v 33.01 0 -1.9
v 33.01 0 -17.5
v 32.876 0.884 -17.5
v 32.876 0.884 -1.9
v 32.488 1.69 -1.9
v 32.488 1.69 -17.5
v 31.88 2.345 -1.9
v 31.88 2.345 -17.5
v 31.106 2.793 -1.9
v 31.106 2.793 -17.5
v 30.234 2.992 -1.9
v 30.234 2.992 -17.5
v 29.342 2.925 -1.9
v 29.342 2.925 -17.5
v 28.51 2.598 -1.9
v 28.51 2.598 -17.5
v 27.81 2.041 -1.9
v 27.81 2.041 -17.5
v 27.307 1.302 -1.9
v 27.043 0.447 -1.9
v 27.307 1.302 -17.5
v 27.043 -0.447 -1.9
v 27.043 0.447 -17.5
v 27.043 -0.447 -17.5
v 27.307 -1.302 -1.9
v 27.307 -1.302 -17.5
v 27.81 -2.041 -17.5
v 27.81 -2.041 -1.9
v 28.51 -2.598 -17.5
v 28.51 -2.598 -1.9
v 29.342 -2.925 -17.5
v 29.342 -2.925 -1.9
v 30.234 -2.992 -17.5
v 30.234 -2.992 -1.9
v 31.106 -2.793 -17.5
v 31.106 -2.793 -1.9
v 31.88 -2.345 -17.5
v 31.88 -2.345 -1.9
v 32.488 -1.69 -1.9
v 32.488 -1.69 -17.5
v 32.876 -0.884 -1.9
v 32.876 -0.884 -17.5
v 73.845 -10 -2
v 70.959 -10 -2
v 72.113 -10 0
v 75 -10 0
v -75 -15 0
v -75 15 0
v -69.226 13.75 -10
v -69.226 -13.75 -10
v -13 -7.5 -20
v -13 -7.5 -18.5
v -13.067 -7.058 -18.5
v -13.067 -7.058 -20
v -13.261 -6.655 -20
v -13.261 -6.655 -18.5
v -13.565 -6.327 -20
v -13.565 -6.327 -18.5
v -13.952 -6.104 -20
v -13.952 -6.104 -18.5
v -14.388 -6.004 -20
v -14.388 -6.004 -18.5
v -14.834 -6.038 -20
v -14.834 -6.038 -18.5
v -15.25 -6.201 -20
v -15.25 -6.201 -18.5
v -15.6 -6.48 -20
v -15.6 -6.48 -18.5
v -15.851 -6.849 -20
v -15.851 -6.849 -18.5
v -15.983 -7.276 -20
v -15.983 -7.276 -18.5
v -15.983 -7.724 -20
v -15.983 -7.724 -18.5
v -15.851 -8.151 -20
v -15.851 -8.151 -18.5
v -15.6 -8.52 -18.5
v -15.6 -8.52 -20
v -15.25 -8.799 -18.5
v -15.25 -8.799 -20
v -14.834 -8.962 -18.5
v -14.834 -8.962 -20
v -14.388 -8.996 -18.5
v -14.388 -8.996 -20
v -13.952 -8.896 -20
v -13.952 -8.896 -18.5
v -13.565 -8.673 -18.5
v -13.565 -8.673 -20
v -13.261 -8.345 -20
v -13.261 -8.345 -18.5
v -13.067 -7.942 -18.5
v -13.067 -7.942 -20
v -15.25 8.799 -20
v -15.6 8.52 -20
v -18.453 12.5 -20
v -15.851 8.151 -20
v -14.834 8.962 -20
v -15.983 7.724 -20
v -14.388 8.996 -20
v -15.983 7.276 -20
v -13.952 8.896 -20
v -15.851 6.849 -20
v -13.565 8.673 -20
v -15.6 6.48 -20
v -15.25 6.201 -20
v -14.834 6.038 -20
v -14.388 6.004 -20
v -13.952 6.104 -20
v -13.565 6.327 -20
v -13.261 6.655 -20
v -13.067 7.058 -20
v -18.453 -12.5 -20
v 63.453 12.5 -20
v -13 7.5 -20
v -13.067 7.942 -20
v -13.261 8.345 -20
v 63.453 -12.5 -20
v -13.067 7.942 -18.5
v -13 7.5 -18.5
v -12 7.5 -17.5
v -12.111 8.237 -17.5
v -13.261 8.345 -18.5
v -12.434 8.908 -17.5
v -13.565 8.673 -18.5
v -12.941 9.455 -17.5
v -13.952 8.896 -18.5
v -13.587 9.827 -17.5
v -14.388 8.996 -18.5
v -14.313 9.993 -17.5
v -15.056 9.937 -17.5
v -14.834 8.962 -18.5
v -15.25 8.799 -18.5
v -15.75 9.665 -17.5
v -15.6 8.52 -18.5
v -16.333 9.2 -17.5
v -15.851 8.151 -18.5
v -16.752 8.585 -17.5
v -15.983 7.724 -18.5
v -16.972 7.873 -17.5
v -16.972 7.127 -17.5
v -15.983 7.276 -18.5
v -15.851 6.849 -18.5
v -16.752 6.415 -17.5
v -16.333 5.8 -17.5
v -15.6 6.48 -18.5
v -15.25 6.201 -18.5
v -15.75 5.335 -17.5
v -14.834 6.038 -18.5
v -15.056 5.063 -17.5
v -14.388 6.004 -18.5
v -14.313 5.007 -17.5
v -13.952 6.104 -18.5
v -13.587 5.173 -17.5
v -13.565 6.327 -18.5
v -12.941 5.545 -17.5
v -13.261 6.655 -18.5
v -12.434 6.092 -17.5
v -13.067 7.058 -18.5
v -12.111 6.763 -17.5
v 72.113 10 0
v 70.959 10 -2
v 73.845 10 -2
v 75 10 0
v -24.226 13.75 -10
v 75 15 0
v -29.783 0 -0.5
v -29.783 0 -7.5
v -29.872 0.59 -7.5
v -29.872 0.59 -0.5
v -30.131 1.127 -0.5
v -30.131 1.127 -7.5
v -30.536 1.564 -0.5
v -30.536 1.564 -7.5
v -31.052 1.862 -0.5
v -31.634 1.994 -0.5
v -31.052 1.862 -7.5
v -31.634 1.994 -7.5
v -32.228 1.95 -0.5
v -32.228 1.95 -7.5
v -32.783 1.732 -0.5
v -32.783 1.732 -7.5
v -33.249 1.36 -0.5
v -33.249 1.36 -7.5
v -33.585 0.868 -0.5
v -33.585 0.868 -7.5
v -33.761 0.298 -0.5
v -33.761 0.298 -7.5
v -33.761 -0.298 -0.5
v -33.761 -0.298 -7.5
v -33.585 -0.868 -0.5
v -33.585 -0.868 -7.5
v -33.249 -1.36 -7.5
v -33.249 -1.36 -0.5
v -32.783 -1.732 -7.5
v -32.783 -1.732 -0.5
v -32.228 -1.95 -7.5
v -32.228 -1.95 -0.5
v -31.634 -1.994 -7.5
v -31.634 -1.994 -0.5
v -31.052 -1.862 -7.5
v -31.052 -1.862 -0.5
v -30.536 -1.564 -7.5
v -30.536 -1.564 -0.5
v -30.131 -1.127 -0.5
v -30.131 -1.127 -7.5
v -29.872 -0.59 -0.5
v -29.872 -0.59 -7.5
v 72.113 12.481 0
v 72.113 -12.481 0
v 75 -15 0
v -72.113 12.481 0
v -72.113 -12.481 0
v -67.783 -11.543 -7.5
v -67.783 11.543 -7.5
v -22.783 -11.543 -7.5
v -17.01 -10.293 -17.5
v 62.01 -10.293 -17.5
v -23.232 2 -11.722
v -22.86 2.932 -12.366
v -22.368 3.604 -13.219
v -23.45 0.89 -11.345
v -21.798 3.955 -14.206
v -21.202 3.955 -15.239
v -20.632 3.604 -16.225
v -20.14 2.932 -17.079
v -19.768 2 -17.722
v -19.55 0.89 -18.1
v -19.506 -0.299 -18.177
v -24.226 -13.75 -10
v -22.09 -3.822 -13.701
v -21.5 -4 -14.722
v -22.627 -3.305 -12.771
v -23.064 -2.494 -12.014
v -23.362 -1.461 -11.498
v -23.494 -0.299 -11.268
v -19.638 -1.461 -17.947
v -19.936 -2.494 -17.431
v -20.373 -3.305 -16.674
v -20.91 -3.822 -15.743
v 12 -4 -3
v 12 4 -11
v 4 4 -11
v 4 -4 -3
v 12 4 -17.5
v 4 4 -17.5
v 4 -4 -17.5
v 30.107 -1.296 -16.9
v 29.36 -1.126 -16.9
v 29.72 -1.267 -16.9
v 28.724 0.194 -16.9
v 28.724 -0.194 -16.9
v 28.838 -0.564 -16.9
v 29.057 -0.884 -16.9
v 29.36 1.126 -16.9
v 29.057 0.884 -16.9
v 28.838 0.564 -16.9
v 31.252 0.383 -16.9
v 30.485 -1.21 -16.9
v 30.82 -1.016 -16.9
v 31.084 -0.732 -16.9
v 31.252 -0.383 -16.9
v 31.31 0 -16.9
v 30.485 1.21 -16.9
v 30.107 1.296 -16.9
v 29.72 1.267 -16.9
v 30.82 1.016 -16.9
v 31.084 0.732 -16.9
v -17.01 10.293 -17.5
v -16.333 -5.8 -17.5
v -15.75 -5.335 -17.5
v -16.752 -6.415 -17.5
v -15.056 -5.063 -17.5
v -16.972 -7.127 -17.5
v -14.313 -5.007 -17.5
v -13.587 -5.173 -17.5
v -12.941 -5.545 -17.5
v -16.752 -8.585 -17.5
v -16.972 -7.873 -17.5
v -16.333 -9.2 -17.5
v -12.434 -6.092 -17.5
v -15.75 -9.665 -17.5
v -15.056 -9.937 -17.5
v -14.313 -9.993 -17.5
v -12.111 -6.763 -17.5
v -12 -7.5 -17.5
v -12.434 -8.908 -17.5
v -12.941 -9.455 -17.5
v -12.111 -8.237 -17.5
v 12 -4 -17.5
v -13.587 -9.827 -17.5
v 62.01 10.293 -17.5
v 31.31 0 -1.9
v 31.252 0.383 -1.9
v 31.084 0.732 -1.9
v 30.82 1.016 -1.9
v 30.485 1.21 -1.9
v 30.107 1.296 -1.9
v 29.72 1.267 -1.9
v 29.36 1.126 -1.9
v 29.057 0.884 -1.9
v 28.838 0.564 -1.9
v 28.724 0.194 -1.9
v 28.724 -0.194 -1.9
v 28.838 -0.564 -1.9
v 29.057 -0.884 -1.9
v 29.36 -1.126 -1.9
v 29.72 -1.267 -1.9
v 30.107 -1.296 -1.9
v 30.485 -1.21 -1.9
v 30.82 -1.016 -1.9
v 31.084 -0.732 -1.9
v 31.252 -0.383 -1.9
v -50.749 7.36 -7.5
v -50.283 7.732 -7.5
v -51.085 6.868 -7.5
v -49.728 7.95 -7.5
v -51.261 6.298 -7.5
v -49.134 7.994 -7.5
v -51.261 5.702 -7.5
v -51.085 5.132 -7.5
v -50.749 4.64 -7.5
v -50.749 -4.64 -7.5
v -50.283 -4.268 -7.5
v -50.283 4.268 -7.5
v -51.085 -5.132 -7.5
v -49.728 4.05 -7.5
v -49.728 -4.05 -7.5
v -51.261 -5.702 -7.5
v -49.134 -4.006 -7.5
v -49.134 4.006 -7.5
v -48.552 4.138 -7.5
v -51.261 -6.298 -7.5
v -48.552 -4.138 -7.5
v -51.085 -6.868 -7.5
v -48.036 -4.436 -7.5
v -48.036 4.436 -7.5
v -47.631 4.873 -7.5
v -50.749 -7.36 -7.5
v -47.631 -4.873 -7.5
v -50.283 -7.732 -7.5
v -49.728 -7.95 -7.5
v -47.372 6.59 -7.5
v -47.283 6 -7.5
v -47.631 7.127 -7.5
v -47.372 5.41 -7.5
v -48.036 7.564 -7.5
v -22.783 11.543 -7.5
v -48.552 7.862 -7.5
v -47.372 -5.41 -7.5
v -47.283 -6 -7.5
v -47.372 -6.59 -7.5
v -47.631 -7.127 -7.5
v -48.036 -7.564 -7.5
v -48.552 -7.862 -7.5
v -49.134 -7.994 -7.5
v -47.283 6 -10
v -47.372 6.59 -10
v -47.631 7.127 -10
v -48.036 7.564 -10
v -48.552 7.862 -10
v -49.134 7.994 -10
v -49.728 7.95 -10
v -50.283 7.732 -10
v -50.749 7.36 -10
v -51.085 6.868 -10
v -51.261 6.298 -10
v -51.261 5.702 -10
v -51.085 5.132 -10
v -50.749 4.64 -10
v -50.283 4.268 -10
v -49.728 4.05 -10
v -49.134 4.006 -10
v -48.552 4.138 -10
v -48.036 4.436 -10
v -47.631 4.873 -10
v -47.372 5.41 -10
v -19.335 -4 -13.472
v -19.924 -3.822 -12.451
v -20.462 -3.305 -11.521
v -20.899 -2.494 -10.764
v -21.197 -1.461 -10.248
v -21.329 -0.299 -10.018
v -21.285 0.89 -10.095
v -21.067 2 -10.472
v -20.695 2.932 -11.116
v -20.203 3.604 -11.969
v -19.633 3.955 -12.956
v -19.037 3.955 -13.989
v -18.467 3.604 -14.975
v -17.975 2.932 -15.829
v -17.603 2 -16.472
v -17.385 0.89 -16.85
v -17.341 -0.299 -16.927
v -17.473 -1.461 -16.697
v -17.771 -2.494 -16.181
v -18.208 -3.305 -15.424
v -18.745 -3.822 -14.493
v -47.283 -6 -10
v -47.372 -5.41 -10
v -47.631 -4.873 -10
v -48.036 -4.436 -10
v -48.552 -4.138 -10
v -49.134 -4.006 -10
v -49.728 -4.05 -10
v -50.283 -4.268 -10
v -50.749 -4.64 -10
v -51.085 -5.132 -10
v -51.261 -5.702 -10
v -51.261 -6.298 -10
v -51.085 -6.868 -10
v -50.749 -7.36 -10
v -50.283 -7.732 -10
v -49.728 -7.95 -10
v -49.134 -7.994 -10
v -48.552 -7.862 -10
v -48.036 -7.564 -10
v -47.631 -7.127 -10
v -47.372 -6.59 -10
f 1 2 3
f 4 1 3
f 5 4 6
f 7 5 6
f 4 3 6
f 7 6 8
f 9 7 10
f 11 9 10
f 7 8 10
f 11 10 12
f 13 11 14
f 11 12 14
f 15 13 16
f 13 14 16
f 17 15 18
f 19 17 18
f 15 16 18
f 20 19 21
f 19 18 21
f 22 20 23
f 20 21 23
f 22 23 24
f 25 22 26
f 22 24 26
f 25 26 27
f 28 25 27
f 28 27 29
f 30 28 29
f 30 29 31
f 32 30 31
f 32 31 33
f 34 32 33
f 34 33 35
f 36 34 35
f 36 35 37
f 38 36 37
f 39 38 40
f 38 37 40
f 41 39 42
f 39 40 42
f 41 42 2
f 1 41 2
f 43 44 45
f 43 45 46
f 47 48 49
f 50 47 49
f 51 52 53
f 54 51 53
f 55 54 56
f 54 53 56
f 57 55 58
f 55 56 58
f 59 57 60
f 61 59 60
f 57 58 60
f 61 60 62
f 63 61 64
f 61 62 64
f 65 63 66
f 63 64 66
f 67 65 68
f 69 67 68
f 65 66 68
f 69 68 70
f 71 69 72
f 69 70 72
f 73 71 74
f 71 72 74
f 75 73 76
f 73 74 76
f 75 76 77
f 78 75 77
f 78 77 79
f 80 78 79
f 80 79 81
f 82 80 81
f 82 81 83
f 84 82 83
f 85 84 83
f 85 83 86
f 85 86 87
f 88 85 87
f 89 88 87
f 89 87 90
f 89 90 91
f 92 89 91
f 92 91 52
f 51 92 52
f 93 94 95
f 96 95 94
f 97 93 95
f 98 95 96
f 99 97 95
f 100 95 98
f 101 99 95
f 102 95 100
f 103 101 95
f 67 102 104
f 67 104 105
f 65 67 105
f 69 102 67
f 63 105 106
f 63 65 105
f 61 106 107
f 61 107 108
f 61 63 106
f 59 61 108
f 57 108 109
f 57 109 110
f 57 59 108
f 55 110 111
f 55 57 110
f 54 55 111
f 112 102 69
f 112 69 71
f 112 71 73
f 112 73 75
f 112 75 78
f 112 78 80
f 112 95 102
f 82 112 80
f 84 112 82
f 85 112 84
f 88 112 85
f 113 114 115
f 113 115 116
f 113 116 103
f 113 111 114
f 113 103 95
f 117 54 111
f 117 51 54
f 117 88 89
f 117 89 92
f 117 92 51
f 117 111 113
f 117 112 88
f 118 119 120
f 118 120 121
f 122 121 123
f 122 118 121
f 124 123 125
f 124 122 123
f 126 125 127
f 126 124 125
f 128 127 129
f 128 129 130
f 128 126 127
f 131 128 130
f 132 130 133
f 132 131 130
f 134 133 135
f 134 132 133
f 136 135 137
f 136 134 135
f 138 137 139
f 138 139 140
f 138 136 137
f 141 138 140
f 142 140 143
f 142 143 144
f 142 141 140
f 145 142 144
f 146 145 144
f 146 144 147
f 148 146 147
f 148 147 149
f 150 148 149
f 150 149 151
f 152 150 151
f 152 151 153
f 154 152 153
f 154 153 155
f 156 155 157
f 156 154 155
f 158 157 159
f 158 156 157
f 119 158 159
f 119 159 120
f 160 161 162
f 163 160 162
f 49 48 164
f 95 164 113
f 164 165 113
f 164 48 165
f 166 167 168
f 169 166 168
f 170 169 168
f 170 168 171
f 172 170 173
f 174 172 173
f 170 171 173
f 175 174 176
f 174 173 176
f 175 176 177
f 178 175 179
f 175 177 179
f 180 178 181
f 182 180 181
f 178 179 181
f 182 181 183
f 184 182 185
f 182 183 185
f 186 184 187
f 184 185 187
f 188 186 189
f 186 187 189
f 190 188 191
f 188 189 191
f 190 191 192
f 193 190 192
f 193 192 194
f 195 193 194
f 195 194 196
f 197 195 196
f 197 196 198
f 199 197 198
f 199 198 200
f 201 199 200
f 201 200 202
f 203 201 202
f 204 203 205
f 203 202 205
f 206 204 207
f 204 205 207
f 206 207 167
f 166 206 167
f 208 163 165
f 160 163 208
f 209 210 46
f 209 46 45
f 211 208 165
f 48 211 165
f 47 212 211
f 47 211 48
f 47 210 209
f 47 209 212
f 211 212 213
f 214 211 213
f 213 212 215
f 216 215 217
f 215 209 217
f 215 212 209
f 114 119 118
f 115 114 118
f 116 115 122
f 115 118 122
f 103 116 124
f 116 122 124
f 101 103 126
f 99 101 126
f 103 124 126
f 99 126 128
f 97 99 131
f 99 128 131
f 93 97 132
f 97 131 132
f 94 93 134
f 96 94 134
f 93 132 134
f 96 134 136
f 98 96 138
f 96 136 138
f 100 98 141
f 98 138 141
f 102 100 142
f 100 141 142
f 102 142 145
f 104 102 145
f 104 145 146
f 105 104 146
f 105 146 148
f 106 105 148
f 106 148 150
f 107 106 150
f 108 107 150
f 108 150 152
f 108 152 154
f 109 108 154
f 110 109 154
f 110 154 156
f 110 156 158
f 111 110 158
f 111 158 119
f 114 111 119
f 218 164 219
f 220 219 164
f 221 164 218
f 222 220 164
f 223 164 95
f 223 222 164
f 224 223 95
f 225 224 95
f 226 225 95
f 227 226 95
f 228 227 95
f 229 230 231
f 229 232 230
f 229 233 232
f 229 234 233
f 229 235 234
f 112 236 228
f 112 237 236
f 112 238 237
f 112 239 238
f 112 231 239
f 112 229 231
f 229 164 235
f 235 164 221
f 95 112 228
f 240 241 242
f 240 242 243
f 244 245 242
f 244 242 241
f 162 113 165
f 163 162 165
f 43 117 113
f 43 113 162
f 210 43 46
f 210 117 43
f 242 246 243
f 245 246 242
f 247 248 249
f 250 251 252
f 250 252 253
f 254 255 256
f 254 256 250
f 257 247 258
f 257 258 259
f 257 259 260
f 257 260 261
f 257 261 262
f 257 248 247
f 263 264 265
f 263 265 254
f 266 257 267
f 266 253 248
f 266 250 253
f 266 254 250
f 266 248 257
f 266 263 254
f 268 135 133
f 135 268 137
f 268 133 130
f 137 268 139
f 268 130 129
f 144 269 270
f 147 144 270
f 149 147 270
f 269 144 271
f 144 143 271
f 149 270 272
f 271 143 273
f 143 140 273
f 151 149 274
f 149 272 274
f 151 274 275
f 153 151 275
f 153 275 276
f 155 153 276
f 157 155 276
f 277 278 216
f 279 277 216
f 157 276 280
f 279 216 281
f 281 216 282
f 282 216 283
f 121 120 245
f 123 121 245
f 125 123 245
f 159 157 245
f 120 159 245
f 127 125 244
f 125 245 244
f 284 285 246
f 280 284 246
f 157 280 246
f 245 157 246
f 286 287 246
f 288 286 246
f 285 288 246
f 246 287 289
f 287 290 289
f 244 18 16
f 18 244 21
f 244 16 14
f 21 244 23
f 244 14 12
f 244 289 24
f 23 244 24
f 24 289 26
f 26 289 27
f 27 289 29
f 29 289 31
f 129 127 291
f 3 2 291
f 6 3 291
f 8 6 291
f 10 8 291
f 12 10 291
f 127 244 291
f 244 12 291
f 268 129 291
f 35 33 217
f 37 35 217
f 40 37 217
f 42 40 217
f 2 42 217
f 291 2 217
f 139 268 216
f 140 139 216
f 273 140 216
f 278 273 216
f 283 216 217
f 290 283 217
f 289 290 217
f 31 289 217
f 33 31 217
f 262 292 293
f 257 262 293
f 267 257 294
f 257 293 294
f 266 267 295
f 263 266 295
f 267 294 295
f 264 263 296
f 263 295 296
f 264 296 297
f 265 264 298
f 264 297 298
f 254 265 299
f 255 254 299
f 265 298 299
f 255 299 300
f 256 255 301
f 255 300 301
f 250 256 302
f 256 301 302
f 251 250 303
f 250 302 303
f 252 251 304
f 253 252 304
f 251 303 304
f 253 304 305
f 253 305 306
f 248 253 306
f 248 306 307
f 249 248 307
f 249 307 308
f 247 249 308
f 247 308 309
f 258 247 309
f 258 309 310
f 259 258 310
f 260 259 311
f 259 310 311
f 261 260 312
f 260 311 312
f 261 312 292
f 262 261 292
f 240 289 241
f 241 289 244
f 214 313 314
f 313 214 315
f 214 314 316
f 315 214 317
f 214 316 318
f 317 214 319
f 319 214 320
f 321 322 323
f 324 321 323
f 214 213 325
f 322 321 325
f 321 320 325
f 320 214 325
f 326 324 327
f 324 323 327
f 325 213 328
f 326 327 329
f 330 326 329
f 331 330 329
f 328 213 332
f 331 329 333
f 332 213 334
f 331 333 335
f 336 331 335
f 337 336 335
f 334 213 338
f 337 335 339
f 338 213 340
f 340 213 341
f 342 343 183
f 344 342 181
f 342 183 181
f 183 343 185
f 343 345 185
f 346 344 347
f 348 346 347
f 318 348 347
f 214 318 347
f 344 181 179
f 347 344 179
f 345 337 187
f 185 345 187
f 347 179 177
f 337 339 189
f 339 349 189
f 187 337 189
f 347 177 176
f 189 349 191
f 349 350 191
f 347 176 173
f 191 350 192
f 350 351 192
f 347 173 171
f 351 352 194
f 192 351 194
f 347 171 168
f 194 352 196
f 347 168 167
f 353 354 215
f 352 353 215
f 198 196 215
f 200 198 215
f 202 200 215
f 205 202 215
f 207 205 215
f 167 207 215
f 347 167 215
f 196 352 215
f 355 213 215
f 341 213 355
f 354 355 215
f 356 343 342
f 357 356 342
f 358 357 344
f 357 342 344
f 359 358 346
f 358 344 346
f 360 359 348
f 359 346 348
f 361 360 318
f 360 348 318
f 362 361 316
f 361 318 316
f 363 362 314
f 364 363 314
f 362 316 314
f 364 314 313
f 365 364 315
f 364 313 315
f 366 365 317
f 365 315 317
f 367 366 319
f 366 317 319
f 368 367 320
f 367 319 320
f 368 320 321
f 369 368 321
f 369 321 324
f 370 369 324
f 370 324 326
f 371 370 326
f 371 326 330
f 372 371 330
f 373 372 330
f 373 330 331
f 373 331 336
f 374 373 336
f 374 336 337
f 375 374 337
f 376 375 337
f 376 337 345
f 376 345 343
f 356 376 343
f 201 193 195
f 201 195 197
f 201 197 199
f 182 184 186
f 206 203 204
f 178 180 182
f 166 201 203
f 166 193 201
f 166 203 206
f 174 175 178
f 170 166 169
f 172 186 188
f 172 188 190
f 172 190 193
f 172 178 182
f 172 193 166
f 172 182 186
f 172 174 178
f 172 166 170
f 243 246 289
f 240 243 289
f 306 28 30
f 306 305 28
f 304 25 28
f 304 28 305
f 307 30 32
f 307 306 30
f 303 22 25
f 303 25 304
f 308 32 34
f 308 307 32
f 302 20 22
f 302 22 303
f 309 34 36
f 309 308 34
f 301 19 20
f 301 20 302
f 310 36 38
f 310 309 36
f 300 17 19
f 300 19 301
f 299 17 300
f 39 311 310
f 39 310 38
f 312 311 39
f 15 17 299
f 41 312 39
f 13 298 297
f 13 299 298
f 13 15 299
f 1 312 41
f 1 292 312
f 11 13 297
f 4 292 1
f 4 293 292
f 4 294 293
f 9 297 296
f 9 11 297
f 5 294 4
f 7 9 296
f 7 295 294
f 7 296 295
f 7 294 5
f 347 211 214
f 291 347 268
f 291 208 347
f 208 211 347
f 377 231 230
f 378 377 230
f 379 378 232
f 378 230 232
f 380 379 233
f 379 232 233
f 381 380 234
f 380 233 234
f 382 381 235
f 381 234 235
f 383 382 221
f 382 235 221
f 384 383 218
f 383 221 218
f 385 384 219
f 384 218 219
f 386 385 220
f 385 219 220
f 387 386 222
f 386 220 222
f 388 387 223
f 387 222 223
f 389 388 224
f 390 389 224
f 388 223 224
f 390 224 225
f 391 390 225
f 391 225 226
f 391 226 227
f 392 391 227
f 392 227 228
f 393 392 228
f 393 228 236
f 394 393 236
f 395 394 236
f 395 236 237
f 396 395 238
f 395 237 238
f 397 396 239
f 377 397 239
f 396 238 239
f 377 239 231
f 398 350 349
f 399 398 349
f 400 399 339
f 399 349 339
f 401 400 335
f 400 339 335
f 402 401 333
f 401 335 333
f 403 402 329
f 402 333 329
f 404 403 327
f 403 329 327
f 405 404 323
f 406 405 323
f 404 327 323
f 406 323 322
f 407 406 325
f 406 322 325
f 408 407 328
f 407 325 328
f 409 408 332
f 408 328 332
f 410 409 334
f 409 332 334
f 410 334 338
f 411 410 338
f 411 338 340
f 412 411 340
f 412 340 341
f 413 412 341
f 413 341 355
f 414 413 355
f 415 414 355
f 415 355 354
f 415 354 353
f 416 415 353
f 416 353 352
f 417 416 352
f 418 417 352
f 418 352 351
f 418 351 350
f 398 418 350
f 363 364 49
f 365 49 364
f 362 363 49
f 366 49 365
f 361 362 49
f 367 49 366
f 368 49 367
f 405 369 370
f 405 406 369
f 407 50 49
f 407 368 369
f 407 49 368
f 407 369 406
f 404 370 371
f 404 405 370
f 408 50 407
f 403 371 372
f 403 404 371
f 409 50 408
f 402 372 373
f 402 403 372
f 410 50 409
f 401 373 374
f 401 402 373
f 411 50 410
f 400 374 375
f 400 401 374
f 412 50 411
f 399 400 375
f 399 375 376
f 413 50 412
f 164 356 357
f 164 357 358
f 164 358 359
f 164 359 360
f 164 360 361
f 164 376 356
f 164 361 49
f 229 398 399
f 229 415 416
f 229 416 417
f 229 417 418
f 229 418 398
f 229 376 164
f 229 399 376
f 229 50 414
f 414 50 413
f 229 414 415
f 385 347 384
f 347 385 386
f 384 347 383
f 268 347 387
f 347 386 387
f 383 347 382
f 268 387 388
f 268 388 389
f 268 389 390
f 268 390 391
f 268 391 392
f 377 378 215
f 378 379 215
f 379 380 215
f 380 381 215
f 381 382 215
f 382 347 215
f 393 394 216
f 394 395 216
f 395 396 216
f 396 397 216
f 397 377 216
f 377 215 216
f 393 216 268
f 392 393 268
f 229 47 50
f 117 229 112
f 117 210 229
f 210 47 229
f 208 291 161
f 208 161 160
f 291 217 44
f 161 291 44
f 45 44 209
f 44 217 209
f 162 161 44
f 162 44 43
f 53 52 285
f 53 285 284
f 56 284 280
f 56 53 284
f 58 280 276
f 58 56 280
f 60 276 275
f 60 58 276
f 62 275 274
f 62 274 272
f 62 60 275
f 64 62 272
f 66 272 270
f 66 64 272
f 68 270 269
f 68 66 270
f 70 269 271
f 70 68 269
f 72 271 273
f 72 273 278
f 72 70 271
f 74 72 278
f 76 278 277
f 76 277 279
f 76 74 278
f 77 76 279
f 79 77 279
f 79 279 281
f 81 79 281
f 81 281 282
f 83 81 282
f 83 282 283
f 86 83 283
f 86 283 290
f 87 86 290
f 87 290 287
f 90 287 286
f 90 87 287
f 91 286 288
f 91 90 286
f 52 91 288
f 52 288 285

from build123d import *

# Parameters (mm, degrees)
PAD001_DEPTH      = 15
POCKET_DEPTH      = 75.001
POCKET_DEPTH_BACK = 75.001
THICKNESS_T       = -2.5
SKETCH006_R       = 3
PAD005_DEPTH      = 15.6
SKETCH007_R       = 1.3
POCKET001_DEPTH   = 15
SKETCH018_R       = 4
POCKET008_DEPTH   = 2.5
SKETCH020_R       = 2
POCKET009_DEPTH   = 12.501
SKETCH021_R       = 2
PAD008_DEPTH      = 7
SKETCH027_R       = 1.5
POCKET014_DEPTH   = 2.501
CHAMFER001_SIZE   = 1
SKETCH028_W       = 10
SKETCH028_H       = 20
POCKET015_DEPTH   = 2
SKETCH032_W       = 8
SKETCH032_H       = 8
PAD011_DEPTH      = 15
POCKET018_DEPTH   = 8


with BuildPart() as part:
    # Sketch001 → Pad001 (new body, symmetric)
    with BuildSketch(Plane.XZ):
        Polygon((-75, 0), (-69.2264973081, -10), (-24.2264973081, -10), (-18.4529946162, -20), (63.4529946162, -20), (75, 0), align=None)
    extrude(amount=PAD001_DEPTH, both=True)

    # Sketch002 → Pocket (cut, two sides)
    with BuildSketch(Plane.YZ) as pocket_sk:
        Polygon((-15, 0), (-12.5, -20), (-15, -20), align=None)
        Polygon((15, -20), (15, 0), (12.5, -20), align=None)
    extrude(amount=-POCKET_DEPTH, mode=Mode.SUBTRACT)
    extrude(pocket_sk.sketch, amount=POCKET_DEPTH_BACK, mode=Mode.SUBTRACT)

    # Thickness
    thickness_openings = [part.faces().sort_by_distance(p)[0] for p in [
        (0, 0, 0),
    ]]
    offset(amount=THICKNESS_T, openings=thickness_openings, kind=Kind.INTERSECTION)

    # Sketch006 (on Face14 of Thickness) → Pad005 (join)
    with BuildSketch(Plane.XY.offset(-17.5)):
        with Locations((30.0096189432, 0)):
            Circle(SKETCH006_R)
    extrude(amount=PAD005_DEPTH)

    # Sketch007 (on Face17 of Pad005) → Pocket001 (cut)
    with BuildSketch(Plane.XY.offset(-1.9)):
        with Locations((30.0096189432, 0)):
            Circle(SKETCH007_R)
    extrude(amount=-POCKET001_DEPTH, mode=Mode.SUBTRACT)

    # Sketch018 (on Face8 of Pocket001) → Pocket008 (cut)
    with BuildSketch(Plane(origin=(-22.5, 0, -12.9903810568), x_dir=(0, -1, 0), z_dir=(-0.8660254038, 0, -0.5))):
        with Locations((0, -2)):
            Circle(SKETCH018_R)
    extrude(amount=-POCKET008_DEPTH, mode=Mode.SUBTRACT)

    # Sketch020 (on Face14 of Pocket008) → Pocket009 (cut, through all)
    with BuildSketch(Plane.XY.offset(-7.5)):
        with Locations((-49.2831216351, 6)):
            Circle(SKETCH020_R)
        with Locations((-49.2831216351, -6)):
            Circle(SKETCH020_R)
    extrude(amount=-POCKET009_DEPTH, mode=Mode.SUBTRACT)

    # Sketch021 (on Face16 of Pocket009) → Pad008 (join)
    with BuildSketch(Plane.XY.offset(-7.5)):
        with Locations((-31.7831216351, 0)):
            Circle(SKETCH021_R)
    extrude(amount=PAD008_DEPTH)

    # Sketch027 (on Face18 of Pad008) → Pocket014 (cut, through all)
    with BuildSketch(Plane.XY.offset(-17.5)):
        with Locations((-14.5, 7.5)):
            Circle(SKETCH027_R)
        with Locations((-14.5, -7.5)):
            Circle(SKETCH027_R)
    extrude(amount=-POCKET014_DEPTH, mode=Mode.SUBTRACT)

    # Chamfer001
    chamfer001_edges = [part.edges().sort_by_distance(p)[0] for p in [
        (-16, 7.5, -17.5),
        (-16, -7.5, -17.5),
    ]]
    chamfer(chamfer001_edges, length=CHAMFER001_SIZE)

    # Sketch028 (on Face18 of Chamfer001) → Pocket015 (cut)
    with BuildSketch(Plane.XY):
        with Locations((70, 0)):
            Rectangle(SKETCH028_W, SKETCH028_H)
    extrude(amount=-POCKET015_DEPTH, mode=Mode.SUBTRACT)

    # Sketch032 (on Face4 of Pocket015) → Pad011 (join)
    with BuildSketch(Plane.XY.offset(-17.5)):
        with Locations((8, 0)):
            Rectangle(SKETCH032_W, SKETCH032_H)
    extrude(amount=PAD011_DEPTH)

    # Sketch033 (on Face17 of Pad011) → Pocket018 (cut)
    with BuildSketch(Plane.YZ.offset(12)):
        Polygon((4, -11), (-4, -3), (-4, -2.5), (4, -2.5), align=None)
    extrude(amount=-POCKET018_DEPTH, mode=Mode.SUBTRACT)


solid = part.part
